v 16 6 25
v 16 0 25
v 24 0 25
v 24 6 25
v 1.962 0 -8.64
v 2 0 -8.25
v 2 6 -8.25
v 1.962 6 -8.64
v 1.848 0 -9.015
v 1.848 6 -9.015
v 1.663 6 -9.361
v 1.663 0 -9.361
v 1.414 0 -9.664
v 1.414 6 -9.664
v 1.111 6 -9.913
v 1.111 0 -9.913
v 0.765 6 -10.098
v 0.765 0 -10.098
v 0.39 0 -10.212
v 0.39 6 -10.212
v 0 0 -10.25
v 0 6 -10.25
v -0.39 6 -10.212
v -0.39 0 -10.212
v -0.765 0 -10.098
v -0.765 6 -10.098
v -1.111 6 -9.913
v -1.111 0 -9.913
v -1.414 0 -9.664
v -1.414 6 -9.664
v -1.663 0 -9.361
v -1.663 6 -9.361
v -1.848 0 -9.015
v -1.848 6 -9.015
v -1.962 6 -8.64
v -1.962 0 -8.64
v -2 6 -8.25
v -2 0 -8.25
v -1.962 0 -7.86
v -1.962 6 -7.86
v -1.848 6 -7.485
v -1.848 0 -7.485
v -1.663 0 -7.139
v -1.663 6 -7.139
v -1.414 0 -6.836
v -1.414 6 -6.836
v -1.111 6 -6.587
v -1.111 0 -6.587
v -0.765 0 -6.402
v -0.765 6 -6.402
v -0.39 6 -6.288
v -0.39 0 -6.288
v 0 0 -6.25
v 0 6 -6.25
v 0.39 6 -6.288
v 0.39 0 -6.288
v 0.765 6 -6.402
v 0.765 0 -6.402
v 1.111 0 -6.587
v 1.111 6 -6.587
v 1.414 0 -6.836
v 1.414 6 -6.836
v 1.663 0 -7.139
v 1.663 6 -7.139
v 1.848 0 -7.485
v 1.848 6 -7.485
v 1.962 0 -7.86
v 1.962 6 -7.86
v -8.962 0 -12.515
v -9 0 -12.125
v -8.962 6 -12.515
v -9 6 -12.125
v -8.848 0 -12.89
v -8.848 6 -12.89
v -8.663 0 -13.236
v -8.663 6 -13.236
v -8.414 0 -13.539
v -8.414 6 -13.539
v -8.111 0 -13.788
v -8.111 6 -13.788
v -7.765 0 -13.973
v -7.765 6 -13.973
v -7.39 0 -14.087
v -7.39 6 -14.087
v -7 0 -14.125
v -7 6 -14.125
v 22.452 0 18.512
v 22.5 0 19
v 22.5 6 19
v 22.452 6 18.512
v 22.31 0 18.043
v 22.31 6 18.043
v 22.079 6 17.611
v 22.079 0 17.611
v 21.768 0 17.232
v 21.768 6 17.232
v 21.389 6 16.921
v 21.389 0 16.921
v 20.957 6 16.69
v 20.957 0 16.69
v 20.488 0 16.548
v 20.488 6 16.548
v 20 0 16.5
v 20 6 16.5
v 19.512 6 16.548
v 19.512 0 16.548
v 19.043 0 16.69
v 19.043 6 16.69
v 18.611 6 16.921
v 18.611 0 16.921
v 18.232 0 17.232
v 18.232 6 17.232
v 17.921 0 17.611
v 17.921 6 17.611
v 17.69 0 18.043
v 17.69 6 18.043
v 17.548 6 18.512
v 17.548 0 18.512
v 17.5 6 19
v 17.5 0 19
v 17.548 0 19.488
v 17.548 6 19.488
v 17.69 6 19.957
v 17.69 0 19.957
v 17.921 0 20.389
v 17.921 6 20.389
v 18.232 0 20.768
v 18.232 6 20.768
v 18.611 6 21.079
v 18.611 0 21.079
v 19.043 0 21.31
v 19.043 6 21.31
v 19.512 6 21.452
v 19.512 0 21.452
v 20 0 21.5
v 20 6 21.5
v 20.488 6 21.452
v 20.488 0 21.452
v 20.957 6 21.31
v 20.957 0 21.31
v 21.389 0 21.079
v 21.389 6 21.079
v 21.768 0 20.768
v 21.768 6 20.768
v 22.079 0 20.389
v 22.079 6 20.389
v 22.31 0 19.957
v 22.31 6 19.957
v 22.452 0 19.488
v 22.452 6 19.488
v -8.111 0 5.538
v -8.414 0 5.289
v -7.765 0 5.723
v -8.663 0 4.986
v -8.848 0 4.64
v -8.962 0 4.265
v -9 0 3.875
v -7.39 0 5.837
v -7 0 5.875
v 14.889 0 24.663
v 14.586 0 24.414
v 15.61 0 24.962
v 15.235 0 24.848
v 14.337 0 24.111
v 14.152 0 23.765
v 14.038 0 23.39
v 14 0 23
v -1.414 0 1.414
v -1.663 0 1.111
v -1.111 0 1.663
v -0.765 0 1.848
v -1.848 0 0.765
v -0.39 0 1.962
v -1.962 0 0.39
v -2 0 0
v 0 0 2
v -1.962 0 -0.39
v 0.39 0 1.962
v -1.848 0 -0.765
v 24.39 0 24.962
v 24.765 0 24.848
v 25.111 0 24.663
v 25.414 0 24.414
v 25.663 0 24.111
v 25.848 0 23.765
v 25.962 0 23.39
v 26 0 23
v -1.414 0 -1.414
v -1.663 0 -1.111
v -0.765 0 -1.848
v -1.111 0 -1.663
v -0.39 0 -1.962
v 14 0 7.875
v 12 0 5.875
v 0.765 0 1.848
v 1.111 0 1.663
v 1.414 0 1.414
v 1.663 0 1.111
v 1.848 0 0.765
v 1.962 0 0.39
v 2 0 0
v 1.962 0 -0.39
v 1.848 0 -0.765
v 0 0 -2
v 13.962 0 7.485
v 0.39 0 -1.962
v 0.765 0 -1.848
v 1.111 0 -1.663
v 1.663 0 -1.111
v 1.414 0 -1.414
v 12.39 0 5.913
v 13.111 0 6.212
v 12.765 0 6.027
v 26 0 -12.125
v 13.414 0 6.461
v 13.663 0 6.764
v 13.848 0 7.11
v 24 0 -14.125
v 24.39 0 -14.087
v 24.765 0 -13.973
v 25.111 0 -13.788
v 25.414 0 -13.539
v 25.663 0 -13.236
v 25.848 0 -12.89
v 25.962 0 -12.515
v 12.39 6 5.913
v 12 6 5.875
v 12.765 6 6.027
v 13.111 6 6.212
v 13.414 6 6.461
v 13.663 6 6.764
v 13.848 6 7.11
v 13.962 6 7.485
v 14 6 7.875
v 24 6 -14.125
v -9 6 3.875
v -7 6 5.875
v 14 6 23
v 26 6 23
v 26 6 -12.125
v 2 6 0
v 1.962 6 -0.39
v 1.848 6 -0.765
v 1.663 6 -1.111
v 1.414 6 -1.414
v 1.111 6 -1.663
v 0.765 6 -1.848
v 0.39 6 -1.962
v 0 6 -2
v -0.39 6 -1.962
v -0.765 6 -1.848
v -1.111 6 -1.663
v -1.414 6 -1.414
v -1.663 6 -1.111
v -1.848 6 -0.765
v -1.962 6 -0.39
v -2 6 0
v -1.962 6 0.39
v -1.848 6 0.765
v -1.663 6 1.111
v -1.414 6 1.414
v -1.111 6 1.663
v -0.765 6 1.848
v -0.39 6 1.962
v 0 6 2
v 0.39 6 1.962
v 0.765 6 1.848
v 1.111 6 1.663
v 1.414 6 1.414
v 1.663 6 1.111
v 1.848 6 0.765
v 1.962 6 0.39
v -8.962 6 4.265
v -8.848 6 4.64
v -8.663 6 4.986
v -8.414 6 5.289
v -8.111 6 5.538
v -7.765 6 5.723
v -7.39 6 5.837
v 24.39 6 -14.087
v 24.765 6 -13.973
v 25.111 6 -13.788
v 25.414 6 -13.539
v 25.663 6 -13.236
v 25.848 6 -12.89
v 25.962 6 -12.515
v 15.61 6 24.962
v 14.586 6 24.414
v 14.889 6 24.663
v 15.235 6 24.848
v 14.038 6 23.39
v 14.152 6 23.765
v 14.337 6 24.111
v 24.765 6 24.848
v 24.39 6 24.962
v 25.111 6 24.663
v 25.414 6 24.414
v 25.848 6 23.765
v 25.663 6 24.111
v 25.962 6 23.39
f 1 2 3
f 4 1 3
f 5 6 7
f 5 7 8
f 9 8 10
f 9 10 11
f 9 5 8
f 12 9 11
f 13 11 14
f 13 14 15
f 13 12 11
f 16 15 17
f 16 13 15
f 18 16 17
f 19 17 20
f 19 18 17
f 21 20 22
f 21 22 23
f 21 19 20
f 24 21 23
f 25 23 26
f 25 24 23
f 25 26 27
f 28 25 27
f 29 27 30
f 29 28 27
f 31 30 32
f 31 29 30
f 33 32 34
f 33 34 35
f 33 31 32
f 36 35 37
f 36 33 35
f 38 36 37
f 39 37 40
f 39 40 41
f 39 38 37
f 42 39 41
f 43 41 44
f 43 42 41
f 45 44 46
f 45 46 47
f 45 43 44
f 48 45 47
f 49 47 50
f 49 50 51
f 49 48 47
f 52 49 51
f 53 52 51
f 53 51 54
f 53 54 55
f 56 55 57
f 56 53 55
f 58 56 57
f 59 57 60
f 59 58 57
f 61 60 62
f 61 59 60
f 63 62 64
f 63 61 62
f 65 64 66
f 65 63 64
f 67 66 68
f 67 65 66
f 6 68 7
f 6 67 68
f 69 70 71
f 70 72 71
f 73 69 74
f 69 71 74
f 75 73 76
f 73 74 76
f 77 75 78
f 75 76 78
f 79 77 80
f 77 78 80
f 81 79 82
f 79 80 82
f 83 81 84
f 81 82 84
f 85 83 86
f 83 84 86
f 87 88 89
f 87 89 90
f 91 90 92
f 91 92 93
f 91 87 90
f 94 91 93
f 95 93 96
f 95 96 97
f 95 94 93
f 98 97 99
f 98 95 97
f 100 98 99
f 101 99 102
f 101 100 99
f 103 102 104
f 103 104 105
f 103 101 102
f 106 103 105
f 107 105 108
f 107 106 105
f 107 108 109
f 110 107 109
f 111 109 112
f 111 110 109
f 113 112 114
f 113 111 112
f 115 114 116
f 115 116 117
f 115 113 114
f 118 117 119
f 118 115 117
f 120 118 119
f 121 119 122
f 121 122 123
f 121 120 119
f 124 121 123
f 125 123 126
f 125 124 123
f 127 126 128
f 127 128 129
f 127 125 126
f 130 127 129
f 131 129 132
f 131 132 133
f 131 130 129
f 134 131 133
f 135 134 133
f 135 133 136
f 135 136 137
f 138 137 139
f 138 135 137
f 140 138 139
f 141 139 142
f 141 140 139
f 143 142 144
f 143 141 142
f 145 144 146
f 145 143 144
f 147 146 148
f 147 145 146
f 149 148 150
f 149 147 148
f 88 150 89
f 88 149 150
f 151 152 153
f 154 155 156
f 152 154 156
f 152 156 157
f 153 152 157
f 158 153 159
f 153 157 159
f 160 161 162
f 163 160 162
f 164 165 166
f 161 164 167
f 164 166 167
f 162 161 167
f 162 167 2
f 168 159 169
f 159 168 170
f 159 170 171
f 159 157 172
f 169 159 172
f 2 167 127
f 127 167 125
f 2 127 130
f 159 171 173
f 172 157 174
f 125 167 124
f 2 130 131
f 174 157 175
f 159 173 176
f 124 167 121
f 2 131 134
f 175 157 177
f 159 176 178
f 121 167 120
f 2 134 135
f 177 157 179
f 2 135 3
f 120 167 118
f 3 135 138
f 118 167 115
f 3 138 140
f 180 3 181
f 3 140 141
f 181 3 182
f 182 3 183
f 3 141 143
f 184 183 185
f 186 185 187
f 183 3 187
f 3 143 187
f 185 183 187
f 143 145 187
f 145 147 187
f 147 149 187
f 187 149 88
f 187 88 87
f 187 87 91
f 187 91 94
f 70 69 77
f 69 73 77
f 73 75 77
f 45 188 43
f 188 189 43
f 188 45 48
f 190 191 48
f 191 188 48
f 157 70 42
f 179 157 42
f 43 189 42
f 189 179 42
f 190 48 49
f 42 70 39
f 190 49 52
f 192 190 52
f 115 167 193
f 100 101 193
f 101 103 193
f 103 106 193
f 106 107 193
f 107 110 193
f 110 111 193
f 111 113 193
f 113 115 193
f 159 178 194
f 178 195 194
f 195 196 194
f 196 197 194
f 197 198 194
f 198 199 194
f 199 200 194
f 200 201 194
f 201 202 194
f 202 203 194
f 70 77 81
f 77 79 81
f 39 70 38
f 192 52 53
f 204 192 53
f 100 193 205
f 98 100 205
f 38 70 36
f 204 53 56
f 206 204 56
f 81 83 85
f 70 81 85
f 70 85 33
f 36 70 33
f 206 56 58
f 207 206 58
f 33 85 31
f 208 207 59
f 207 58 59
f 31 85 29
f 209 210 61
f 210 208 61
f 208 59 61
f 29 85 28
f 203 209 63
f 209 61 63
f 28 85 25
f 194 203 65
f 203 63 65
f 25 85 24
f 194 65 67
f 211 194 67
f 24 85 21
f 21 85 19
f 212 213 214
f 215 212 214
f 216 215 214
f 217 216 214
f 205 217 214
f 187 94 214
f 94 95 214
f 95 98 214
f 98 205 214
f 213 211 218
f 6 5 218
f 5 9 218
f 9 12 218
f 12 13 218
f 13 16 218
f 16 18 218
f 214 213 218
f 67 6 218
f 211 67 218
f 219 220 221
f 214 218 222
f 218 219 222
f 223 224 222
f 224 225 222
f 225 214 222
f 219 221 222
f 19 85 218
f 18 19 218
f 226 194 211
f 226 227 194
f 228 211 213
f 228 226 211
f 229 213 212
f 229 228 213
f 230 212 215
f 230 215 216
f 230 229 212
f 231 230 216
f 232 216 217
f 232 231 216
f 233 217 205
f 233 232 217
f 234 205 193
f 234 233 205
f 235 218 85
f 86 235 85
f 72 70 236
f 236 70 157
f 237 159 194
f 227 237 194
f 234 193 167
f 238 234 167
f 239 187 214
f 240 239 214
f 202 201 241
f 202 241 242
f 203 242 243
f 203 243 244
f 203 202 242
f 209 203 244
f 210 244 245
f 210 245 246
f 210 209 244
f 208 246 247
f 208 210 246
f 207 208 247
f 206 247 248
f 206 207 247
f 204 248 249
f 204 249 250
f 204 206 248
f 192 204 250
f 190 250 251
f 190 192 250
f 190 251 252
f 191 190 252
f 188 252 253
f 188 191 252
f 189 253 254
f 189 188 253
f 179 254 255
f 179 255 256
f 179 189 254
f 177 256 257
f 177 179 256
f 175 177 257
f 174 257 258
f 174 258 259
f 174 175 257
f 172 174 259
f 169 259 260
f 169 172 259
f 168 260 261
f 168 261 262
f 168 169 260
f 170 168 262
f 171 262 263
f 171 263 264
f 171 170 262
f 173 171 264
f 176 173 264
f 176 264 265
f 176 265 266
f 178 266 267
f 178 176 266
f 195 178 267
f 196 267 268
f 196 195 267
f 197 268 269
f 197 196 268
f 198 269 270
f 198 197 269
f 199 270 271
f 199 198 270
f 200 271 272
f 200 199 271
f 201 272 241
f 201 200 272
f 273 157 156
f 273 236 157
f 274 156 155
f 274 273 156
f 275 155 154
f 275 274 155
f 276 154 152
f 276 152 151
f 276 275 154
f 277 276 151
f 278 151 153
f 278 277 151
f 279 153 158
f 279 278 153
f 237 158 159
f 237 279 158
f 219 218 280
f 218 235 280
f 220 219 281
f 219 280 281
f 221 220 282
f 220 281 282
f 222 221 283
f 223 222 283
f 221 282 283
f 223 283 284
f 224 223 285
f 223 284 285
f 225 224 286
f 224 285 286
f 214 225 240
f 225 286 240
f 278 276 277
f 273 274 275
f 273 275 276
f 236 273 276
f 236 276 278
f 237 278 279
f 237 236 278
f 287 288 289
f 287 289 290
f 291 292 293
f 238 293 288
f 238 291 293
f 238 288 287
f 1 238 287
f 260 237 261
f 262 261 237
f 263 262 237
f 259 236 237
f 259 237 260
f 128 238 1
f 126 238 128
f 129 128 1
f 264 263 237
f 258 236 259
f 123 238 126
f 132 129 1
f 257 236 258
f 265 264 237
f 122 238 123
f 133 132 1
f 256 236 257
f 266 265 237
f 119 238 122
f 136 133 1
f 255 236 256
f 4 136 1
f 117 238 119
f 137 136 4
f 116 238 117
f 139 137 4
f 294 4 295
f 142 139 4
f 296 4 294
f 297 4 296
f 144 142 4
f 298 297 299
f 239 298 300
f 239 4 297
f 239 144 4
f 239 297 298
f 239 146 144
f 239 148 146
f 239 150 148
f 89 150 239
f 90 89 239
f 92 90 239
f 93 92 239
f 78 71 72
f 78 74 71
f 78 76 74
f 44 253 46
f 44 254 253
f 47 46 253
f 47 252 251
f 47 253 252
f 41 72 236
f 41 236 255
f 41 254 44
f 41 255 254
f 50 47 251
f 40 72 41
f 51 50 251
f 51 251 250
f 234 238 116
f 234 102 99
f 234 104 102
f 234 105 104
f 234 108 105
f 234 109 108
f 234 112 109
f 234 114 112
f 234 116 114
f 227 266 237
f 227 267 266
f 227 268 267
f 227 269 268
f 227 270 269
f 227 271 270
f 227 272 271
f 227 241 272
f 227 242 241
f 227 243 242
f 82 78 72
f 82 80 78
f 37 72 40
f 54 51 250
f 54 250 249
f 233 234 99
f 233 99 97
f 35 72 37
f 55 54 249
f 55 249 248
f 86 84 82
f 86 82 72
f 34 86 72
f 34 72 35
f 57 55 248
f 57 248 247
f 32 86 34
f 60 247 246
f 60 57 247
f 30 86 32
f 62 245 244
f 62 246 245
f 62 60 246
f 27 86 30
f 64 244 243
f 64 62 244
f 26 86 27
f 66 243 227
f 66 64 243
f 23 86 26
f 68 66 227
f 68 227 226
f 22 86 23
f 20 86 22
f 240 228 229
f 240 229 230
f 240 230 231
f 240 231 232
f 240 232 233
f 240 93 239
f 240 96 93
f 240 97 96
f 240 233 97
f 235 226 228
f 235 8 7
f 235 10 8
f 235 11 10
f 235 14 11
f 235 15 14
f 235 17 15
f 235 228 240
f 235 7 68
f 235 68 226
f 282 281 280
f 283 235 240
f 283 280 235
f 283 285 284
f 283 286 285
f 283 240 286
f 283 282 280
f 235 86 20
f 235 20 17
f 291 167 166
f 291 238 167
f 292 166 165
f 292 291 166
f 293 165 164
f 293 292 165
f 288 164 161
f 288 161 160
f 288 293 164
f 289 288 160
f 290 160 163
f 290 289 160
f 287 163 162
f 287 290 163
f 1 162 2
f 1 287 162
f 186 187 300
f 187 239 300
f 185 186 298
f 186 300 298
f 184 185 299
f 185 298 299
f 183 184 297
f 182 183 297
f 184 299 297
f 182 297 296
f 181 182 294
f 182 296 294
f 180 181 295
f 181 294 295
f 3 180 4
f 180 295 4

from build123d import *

# Parameters (mm, degrees)
SKETCH1_R           = 2
SKETCH1_R_2         = 2.5
BOSS_EXTRUDE1_DEPTH = 6
FILLET1_R           = 2


with BuildPart() as part:
    # Sketch1 → Boss-Extrude1 (new body)
    with BuildSketch(Plane(origin=(0, 0, 0), x_dir=(1, 0, 0), z_dir=(0, 1, 0))):
        Polygon((-9, 14.125), (-9, -5.875), (14, -5.875), (14, -25), (26, -25), (26, 14.125), align=None)
        with Locations((0, 8.25)):
            Circle(SKETCH1_R, mode=Mode.SUBTRACT)
        Circle(SKETCH1_R, mode=Mode.SUBTRACT)
        with Locations((20, -19)):
            Circle(SKETCH1_R_2, mode=Mode.SUBTRACT)
    extrude(amount=BOSS_EXTRUDE1_DEPTH)

    # Fillet1
    fillet1_edges = [part.edges().sort_by_distance(p)[0] for p in [
        (14, 3, 25),
        (14, 3, 5.875),
        (-9, 3, 5.875),
        (-9, 3, -14.125),
        (26, 3, -14.125),
        (26, 3, 25),
    ]]
    fillet(fillet1_edges, radius=FILLET1_R)


solid = part.part
